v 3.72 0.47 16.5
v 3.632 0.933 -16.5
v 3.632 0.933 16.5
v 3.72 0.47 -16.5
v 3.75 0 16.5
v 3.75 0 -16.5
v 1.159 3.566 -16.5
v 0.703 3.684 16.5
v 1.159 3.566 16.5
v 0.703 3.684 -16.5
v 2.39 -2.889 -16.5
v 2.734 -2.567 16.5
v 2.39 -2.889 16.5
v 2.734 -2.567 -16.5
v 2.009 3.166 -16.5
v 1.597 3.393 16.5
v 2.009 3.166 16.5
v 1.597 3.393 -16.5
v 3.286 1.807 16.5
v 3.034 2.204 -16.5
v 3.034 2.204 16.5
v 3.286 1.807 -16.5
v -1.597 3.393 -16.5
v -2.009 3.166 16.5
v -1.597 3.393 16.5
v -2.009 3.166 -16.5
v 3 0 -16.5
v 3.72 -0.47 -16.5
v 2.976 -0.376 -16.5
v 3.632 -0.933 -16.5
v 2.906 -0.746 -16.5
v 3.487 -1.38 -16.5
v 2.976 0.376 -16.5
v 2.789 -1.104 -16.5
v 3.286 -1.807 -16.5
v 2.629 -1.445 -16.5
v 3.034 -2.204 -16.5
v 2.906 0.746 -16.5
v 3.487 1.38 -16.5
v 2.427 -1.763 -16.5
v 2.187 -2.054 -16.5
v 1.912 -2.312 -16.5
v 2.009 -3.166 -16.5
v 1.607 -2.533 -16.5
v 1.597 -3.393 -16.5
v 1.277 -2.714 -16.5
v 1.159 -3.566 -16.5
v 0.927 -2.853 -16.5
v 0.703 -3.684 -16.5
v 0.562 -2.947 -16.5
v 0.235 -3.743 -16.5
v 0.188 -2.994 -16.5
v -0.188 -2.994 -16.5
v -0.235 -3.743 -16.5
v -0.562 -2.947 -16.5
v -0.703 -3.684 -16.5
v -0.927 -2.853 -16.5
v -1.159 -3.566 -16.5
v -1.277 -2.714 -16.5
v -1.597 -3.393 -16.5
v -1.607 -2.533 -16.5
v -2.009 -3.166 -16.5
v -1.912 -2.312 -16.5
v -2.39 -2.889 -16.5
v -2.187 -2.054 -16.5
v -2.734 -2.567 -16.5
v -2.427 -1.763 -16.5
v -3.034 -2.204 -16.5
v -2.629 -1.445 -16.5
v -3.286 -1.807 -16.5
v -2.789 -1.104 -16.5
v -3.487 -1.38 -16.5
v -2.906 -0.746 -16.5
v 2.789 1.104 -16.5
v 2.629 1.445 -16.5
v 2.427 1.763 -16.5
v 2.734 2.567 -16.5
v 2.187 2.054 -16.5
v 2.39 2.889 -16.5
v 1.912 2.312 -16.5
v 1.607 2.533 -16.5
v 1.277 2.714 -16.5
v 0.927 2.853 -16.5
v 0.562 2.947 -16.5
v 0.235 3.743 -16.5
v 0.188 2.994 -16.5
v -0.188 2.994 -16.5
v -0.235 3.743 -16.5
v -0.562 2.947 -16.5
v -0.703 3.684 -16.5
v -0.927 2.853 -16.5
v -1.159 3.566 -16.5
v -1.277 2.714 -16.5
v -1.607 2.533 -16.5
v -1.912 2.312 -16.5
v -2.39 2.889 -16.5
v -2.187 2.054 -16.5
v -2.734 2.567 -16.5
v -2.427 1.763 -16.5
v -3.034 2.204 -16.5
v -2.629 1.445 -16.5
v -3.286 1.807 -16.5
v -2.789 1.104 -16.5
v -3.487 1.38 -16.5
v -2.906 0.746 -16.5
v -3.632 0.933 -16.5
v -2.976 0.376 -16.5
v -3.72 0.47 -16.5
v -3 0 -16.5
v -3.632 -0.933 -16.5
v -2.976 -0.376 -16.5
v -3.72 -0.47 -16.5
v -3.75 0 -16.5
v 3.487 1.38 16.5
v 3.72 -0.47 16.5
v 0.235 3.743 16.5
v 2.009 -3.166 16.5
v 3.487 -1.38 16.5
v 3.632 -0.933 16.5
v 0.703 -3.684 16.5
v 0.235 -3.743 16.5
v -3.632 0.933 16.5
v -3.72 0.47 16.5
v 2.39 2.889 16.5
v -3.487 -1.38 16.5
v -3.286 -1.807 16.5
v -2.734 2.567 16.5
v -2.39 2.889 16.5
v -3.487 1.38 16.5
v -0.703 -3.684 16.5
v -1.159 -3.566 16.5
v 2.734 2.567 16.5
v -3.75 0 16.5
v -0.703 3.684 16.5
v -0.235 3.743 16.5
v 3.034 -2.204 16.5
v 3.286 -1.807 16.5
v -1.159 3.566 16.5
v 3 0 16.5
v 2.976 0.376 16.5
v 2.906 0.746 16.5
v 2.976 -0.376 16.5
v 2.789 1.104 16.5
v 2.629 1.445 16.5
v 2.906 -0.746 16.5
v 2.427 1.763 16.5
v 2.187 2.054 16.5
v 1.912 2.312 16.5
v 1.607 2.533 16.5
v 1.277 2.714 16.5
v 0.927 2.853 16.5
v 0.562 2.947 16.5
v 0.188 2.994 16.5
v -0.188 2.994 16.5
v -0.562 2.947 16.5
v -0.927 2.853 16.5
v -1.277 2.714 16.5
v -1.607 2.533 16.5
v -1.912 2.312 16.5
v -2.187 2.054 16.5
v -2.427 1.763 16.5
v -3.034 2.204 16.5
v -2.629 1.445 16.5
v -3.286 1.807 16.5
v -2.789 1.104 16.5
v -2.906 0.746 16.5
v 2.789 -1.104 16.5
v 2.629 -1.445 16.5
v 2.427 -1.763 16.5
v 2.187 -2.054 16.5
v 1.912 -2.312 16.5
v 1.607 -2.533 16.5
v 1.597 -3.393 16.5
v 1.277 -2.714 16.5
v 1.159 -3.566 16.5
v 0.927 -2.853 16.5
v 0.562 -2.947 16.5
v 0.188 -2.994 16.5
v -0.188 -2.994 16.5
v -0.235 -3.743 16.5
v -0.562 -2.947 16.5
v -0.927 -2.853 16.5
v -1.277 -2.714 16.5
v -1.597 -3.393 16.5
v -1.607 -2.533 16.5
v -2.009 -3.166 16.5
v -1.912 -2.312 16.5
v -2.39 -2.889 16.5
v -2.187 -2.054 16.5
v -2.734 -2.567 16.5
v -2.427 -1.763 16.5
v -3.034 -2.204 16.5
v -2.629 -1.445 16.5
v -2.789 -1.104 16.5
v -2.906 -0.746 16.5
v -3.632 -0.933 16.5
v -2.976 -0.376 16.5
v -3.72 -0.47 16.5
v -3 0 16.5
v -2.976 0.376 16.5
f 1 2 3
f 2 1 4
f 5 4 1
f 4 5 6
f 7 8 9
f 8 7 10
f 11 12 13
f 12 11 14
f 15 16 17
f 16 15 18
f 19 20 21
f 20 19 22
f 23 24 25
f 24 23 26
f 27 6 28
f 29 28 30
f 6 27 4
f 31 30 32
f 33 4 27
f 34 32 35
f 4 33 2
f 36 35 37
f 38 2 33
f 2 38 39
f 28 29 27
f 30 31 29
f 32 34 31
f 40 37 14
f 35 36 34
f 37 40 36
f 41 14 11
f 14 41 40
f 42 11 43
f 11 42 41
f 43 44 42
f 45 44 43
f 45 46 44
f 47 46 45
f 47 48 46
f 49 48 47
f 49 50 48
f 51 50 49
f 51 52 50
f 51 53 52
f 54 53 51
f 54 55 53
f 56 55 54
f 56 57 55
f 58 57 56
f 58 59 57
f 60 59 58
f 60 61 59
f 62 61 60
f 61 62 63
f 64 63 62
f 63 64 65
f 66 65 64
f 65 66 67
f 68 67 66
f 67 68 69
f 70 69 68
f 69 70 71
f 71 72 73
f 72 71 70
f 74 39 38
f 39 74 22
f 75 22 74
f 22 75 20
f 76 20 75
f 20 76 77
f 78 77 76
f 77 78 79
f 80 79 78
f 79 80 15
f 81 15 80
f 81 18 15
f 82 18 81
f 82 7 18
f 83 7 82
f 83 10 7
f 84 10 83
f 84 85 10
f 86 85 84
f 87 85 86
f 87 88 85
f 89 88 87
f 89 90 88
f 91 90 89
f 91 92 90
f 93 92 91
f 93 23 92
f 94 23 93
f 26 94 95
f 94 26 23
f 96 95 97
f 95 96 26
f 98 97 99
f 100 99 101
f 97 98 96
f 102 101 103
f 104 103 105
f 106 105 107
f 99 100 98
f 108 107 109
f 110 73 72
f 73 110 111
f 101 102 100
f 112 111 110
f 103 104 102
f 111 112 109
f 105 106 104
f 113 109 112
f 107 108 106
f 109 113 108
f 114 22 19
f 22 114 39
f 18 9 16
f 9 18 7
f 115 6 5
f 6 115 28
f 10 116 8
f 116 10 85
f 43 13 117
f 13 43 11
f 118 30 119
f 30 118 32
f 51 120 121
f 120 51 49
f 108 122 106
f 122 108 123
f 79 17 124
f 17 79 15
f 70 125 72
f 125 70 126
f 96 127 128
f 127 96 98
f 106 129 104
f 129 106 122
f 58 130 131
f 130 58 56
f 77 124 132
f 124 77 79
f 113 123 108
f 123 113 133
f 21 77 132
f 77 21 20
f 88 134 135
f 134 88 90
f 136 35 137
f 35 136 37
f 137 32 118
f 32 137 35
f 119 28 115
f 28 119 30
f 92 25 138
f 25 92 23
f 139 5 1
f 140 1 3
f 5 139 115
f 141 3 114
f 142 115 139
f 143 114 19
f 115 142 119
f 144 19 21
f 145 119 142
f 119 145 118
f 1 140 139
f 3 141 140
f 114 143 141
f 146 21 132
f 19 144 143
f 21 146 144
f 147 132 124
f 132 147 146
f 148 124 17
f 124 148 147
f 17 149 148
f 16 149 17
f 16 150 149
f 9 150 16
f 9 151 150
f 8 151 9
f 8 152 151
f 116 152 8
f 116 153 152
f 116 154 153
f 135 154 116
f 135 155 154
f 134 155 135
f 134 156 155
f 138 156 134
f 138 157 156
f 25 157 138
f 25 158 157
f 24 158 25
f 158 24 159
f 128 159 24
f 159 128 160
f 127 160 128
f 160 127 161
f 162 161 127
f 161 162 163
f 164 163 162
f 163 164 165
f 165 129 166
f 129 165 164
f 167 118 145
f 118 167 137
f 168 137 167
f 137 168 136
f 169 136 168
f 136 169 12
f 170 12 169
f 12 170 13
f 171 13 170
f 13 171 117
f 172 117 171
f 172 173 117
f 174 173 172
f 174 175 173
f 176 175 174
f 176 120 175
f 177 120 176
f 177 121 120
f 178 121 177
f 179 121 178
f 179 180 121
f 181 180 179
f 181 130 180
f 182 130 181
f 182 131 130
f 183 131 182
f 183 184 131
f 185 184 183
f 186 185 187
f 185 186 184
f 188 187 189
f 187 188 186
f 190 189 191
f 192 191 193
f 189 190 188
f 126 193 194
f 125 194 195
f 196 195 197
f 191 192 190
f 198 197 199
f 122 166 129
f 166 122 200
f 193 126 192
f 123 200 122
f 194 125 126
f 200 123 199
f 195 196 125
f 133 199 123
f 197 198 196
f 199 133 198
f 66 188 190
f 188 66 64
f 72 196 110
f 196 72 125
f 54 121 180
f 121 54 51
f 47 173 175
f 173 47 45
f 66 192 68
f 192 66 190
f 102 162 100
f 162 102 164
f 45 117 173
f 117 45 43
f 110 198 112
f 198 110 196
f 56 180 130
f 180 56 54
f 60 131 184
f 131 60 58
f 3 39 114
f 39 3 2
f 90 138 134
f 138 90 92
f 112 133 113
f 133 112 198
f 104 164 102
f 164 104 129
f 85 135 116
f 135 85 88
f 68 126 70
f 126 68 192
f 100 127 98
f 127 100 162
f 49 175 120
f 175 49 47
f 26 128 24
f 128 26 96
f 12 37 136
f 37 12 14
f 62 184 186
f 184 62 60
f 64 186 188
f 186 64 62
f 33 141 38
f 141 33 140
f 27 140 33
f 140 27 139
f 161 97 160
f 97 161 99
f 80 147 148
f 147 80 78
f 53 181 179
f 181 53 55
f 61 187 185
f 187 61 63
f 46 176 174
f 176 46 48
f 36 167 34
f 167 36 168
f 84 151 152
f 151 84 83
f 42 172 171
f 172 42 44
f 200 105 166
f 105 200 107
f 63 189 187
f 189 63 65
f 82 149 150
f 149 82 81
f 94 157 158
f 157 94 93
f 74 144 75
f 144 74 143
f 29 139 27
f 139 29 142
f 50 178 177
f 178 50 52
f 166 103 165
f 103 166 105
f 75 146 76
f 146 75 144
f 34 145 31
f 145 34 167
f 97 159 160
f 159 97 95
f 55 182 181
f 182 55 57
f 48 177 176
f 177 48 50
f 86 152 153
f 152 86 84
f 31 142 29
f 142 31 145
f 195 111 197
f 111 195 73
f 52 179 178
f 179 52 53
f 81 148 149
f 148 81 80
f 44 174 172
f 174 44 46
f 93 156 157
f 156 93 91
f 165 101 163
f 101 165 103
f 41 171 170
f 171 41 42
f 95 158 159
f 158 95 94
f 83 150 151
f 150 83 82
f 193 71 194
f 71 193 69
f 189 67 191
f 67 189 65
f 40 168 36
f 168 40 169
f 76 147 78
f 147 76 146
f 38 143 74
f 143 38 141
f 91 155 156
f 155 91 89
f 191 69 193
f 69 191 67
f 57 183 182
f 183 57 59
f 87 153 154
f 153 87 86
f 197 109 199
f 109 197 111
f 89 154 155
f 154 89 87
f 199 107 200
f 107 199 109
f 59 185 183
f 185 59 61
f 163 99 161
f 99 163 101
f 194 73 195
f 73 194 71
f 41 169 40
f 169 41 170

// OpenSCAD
$fn = 50;


difference() {
	union() {
		translate(v = [0, 0, -16.5000000000]) {
			cylinder(h = 33, r = 3.7500000000);
		}
	}
	union() {
		translate(v = [0, 0, -100.0000000000]) {
			cylinder(h = 200, r = 3.0000000000);
		}
	}
}
